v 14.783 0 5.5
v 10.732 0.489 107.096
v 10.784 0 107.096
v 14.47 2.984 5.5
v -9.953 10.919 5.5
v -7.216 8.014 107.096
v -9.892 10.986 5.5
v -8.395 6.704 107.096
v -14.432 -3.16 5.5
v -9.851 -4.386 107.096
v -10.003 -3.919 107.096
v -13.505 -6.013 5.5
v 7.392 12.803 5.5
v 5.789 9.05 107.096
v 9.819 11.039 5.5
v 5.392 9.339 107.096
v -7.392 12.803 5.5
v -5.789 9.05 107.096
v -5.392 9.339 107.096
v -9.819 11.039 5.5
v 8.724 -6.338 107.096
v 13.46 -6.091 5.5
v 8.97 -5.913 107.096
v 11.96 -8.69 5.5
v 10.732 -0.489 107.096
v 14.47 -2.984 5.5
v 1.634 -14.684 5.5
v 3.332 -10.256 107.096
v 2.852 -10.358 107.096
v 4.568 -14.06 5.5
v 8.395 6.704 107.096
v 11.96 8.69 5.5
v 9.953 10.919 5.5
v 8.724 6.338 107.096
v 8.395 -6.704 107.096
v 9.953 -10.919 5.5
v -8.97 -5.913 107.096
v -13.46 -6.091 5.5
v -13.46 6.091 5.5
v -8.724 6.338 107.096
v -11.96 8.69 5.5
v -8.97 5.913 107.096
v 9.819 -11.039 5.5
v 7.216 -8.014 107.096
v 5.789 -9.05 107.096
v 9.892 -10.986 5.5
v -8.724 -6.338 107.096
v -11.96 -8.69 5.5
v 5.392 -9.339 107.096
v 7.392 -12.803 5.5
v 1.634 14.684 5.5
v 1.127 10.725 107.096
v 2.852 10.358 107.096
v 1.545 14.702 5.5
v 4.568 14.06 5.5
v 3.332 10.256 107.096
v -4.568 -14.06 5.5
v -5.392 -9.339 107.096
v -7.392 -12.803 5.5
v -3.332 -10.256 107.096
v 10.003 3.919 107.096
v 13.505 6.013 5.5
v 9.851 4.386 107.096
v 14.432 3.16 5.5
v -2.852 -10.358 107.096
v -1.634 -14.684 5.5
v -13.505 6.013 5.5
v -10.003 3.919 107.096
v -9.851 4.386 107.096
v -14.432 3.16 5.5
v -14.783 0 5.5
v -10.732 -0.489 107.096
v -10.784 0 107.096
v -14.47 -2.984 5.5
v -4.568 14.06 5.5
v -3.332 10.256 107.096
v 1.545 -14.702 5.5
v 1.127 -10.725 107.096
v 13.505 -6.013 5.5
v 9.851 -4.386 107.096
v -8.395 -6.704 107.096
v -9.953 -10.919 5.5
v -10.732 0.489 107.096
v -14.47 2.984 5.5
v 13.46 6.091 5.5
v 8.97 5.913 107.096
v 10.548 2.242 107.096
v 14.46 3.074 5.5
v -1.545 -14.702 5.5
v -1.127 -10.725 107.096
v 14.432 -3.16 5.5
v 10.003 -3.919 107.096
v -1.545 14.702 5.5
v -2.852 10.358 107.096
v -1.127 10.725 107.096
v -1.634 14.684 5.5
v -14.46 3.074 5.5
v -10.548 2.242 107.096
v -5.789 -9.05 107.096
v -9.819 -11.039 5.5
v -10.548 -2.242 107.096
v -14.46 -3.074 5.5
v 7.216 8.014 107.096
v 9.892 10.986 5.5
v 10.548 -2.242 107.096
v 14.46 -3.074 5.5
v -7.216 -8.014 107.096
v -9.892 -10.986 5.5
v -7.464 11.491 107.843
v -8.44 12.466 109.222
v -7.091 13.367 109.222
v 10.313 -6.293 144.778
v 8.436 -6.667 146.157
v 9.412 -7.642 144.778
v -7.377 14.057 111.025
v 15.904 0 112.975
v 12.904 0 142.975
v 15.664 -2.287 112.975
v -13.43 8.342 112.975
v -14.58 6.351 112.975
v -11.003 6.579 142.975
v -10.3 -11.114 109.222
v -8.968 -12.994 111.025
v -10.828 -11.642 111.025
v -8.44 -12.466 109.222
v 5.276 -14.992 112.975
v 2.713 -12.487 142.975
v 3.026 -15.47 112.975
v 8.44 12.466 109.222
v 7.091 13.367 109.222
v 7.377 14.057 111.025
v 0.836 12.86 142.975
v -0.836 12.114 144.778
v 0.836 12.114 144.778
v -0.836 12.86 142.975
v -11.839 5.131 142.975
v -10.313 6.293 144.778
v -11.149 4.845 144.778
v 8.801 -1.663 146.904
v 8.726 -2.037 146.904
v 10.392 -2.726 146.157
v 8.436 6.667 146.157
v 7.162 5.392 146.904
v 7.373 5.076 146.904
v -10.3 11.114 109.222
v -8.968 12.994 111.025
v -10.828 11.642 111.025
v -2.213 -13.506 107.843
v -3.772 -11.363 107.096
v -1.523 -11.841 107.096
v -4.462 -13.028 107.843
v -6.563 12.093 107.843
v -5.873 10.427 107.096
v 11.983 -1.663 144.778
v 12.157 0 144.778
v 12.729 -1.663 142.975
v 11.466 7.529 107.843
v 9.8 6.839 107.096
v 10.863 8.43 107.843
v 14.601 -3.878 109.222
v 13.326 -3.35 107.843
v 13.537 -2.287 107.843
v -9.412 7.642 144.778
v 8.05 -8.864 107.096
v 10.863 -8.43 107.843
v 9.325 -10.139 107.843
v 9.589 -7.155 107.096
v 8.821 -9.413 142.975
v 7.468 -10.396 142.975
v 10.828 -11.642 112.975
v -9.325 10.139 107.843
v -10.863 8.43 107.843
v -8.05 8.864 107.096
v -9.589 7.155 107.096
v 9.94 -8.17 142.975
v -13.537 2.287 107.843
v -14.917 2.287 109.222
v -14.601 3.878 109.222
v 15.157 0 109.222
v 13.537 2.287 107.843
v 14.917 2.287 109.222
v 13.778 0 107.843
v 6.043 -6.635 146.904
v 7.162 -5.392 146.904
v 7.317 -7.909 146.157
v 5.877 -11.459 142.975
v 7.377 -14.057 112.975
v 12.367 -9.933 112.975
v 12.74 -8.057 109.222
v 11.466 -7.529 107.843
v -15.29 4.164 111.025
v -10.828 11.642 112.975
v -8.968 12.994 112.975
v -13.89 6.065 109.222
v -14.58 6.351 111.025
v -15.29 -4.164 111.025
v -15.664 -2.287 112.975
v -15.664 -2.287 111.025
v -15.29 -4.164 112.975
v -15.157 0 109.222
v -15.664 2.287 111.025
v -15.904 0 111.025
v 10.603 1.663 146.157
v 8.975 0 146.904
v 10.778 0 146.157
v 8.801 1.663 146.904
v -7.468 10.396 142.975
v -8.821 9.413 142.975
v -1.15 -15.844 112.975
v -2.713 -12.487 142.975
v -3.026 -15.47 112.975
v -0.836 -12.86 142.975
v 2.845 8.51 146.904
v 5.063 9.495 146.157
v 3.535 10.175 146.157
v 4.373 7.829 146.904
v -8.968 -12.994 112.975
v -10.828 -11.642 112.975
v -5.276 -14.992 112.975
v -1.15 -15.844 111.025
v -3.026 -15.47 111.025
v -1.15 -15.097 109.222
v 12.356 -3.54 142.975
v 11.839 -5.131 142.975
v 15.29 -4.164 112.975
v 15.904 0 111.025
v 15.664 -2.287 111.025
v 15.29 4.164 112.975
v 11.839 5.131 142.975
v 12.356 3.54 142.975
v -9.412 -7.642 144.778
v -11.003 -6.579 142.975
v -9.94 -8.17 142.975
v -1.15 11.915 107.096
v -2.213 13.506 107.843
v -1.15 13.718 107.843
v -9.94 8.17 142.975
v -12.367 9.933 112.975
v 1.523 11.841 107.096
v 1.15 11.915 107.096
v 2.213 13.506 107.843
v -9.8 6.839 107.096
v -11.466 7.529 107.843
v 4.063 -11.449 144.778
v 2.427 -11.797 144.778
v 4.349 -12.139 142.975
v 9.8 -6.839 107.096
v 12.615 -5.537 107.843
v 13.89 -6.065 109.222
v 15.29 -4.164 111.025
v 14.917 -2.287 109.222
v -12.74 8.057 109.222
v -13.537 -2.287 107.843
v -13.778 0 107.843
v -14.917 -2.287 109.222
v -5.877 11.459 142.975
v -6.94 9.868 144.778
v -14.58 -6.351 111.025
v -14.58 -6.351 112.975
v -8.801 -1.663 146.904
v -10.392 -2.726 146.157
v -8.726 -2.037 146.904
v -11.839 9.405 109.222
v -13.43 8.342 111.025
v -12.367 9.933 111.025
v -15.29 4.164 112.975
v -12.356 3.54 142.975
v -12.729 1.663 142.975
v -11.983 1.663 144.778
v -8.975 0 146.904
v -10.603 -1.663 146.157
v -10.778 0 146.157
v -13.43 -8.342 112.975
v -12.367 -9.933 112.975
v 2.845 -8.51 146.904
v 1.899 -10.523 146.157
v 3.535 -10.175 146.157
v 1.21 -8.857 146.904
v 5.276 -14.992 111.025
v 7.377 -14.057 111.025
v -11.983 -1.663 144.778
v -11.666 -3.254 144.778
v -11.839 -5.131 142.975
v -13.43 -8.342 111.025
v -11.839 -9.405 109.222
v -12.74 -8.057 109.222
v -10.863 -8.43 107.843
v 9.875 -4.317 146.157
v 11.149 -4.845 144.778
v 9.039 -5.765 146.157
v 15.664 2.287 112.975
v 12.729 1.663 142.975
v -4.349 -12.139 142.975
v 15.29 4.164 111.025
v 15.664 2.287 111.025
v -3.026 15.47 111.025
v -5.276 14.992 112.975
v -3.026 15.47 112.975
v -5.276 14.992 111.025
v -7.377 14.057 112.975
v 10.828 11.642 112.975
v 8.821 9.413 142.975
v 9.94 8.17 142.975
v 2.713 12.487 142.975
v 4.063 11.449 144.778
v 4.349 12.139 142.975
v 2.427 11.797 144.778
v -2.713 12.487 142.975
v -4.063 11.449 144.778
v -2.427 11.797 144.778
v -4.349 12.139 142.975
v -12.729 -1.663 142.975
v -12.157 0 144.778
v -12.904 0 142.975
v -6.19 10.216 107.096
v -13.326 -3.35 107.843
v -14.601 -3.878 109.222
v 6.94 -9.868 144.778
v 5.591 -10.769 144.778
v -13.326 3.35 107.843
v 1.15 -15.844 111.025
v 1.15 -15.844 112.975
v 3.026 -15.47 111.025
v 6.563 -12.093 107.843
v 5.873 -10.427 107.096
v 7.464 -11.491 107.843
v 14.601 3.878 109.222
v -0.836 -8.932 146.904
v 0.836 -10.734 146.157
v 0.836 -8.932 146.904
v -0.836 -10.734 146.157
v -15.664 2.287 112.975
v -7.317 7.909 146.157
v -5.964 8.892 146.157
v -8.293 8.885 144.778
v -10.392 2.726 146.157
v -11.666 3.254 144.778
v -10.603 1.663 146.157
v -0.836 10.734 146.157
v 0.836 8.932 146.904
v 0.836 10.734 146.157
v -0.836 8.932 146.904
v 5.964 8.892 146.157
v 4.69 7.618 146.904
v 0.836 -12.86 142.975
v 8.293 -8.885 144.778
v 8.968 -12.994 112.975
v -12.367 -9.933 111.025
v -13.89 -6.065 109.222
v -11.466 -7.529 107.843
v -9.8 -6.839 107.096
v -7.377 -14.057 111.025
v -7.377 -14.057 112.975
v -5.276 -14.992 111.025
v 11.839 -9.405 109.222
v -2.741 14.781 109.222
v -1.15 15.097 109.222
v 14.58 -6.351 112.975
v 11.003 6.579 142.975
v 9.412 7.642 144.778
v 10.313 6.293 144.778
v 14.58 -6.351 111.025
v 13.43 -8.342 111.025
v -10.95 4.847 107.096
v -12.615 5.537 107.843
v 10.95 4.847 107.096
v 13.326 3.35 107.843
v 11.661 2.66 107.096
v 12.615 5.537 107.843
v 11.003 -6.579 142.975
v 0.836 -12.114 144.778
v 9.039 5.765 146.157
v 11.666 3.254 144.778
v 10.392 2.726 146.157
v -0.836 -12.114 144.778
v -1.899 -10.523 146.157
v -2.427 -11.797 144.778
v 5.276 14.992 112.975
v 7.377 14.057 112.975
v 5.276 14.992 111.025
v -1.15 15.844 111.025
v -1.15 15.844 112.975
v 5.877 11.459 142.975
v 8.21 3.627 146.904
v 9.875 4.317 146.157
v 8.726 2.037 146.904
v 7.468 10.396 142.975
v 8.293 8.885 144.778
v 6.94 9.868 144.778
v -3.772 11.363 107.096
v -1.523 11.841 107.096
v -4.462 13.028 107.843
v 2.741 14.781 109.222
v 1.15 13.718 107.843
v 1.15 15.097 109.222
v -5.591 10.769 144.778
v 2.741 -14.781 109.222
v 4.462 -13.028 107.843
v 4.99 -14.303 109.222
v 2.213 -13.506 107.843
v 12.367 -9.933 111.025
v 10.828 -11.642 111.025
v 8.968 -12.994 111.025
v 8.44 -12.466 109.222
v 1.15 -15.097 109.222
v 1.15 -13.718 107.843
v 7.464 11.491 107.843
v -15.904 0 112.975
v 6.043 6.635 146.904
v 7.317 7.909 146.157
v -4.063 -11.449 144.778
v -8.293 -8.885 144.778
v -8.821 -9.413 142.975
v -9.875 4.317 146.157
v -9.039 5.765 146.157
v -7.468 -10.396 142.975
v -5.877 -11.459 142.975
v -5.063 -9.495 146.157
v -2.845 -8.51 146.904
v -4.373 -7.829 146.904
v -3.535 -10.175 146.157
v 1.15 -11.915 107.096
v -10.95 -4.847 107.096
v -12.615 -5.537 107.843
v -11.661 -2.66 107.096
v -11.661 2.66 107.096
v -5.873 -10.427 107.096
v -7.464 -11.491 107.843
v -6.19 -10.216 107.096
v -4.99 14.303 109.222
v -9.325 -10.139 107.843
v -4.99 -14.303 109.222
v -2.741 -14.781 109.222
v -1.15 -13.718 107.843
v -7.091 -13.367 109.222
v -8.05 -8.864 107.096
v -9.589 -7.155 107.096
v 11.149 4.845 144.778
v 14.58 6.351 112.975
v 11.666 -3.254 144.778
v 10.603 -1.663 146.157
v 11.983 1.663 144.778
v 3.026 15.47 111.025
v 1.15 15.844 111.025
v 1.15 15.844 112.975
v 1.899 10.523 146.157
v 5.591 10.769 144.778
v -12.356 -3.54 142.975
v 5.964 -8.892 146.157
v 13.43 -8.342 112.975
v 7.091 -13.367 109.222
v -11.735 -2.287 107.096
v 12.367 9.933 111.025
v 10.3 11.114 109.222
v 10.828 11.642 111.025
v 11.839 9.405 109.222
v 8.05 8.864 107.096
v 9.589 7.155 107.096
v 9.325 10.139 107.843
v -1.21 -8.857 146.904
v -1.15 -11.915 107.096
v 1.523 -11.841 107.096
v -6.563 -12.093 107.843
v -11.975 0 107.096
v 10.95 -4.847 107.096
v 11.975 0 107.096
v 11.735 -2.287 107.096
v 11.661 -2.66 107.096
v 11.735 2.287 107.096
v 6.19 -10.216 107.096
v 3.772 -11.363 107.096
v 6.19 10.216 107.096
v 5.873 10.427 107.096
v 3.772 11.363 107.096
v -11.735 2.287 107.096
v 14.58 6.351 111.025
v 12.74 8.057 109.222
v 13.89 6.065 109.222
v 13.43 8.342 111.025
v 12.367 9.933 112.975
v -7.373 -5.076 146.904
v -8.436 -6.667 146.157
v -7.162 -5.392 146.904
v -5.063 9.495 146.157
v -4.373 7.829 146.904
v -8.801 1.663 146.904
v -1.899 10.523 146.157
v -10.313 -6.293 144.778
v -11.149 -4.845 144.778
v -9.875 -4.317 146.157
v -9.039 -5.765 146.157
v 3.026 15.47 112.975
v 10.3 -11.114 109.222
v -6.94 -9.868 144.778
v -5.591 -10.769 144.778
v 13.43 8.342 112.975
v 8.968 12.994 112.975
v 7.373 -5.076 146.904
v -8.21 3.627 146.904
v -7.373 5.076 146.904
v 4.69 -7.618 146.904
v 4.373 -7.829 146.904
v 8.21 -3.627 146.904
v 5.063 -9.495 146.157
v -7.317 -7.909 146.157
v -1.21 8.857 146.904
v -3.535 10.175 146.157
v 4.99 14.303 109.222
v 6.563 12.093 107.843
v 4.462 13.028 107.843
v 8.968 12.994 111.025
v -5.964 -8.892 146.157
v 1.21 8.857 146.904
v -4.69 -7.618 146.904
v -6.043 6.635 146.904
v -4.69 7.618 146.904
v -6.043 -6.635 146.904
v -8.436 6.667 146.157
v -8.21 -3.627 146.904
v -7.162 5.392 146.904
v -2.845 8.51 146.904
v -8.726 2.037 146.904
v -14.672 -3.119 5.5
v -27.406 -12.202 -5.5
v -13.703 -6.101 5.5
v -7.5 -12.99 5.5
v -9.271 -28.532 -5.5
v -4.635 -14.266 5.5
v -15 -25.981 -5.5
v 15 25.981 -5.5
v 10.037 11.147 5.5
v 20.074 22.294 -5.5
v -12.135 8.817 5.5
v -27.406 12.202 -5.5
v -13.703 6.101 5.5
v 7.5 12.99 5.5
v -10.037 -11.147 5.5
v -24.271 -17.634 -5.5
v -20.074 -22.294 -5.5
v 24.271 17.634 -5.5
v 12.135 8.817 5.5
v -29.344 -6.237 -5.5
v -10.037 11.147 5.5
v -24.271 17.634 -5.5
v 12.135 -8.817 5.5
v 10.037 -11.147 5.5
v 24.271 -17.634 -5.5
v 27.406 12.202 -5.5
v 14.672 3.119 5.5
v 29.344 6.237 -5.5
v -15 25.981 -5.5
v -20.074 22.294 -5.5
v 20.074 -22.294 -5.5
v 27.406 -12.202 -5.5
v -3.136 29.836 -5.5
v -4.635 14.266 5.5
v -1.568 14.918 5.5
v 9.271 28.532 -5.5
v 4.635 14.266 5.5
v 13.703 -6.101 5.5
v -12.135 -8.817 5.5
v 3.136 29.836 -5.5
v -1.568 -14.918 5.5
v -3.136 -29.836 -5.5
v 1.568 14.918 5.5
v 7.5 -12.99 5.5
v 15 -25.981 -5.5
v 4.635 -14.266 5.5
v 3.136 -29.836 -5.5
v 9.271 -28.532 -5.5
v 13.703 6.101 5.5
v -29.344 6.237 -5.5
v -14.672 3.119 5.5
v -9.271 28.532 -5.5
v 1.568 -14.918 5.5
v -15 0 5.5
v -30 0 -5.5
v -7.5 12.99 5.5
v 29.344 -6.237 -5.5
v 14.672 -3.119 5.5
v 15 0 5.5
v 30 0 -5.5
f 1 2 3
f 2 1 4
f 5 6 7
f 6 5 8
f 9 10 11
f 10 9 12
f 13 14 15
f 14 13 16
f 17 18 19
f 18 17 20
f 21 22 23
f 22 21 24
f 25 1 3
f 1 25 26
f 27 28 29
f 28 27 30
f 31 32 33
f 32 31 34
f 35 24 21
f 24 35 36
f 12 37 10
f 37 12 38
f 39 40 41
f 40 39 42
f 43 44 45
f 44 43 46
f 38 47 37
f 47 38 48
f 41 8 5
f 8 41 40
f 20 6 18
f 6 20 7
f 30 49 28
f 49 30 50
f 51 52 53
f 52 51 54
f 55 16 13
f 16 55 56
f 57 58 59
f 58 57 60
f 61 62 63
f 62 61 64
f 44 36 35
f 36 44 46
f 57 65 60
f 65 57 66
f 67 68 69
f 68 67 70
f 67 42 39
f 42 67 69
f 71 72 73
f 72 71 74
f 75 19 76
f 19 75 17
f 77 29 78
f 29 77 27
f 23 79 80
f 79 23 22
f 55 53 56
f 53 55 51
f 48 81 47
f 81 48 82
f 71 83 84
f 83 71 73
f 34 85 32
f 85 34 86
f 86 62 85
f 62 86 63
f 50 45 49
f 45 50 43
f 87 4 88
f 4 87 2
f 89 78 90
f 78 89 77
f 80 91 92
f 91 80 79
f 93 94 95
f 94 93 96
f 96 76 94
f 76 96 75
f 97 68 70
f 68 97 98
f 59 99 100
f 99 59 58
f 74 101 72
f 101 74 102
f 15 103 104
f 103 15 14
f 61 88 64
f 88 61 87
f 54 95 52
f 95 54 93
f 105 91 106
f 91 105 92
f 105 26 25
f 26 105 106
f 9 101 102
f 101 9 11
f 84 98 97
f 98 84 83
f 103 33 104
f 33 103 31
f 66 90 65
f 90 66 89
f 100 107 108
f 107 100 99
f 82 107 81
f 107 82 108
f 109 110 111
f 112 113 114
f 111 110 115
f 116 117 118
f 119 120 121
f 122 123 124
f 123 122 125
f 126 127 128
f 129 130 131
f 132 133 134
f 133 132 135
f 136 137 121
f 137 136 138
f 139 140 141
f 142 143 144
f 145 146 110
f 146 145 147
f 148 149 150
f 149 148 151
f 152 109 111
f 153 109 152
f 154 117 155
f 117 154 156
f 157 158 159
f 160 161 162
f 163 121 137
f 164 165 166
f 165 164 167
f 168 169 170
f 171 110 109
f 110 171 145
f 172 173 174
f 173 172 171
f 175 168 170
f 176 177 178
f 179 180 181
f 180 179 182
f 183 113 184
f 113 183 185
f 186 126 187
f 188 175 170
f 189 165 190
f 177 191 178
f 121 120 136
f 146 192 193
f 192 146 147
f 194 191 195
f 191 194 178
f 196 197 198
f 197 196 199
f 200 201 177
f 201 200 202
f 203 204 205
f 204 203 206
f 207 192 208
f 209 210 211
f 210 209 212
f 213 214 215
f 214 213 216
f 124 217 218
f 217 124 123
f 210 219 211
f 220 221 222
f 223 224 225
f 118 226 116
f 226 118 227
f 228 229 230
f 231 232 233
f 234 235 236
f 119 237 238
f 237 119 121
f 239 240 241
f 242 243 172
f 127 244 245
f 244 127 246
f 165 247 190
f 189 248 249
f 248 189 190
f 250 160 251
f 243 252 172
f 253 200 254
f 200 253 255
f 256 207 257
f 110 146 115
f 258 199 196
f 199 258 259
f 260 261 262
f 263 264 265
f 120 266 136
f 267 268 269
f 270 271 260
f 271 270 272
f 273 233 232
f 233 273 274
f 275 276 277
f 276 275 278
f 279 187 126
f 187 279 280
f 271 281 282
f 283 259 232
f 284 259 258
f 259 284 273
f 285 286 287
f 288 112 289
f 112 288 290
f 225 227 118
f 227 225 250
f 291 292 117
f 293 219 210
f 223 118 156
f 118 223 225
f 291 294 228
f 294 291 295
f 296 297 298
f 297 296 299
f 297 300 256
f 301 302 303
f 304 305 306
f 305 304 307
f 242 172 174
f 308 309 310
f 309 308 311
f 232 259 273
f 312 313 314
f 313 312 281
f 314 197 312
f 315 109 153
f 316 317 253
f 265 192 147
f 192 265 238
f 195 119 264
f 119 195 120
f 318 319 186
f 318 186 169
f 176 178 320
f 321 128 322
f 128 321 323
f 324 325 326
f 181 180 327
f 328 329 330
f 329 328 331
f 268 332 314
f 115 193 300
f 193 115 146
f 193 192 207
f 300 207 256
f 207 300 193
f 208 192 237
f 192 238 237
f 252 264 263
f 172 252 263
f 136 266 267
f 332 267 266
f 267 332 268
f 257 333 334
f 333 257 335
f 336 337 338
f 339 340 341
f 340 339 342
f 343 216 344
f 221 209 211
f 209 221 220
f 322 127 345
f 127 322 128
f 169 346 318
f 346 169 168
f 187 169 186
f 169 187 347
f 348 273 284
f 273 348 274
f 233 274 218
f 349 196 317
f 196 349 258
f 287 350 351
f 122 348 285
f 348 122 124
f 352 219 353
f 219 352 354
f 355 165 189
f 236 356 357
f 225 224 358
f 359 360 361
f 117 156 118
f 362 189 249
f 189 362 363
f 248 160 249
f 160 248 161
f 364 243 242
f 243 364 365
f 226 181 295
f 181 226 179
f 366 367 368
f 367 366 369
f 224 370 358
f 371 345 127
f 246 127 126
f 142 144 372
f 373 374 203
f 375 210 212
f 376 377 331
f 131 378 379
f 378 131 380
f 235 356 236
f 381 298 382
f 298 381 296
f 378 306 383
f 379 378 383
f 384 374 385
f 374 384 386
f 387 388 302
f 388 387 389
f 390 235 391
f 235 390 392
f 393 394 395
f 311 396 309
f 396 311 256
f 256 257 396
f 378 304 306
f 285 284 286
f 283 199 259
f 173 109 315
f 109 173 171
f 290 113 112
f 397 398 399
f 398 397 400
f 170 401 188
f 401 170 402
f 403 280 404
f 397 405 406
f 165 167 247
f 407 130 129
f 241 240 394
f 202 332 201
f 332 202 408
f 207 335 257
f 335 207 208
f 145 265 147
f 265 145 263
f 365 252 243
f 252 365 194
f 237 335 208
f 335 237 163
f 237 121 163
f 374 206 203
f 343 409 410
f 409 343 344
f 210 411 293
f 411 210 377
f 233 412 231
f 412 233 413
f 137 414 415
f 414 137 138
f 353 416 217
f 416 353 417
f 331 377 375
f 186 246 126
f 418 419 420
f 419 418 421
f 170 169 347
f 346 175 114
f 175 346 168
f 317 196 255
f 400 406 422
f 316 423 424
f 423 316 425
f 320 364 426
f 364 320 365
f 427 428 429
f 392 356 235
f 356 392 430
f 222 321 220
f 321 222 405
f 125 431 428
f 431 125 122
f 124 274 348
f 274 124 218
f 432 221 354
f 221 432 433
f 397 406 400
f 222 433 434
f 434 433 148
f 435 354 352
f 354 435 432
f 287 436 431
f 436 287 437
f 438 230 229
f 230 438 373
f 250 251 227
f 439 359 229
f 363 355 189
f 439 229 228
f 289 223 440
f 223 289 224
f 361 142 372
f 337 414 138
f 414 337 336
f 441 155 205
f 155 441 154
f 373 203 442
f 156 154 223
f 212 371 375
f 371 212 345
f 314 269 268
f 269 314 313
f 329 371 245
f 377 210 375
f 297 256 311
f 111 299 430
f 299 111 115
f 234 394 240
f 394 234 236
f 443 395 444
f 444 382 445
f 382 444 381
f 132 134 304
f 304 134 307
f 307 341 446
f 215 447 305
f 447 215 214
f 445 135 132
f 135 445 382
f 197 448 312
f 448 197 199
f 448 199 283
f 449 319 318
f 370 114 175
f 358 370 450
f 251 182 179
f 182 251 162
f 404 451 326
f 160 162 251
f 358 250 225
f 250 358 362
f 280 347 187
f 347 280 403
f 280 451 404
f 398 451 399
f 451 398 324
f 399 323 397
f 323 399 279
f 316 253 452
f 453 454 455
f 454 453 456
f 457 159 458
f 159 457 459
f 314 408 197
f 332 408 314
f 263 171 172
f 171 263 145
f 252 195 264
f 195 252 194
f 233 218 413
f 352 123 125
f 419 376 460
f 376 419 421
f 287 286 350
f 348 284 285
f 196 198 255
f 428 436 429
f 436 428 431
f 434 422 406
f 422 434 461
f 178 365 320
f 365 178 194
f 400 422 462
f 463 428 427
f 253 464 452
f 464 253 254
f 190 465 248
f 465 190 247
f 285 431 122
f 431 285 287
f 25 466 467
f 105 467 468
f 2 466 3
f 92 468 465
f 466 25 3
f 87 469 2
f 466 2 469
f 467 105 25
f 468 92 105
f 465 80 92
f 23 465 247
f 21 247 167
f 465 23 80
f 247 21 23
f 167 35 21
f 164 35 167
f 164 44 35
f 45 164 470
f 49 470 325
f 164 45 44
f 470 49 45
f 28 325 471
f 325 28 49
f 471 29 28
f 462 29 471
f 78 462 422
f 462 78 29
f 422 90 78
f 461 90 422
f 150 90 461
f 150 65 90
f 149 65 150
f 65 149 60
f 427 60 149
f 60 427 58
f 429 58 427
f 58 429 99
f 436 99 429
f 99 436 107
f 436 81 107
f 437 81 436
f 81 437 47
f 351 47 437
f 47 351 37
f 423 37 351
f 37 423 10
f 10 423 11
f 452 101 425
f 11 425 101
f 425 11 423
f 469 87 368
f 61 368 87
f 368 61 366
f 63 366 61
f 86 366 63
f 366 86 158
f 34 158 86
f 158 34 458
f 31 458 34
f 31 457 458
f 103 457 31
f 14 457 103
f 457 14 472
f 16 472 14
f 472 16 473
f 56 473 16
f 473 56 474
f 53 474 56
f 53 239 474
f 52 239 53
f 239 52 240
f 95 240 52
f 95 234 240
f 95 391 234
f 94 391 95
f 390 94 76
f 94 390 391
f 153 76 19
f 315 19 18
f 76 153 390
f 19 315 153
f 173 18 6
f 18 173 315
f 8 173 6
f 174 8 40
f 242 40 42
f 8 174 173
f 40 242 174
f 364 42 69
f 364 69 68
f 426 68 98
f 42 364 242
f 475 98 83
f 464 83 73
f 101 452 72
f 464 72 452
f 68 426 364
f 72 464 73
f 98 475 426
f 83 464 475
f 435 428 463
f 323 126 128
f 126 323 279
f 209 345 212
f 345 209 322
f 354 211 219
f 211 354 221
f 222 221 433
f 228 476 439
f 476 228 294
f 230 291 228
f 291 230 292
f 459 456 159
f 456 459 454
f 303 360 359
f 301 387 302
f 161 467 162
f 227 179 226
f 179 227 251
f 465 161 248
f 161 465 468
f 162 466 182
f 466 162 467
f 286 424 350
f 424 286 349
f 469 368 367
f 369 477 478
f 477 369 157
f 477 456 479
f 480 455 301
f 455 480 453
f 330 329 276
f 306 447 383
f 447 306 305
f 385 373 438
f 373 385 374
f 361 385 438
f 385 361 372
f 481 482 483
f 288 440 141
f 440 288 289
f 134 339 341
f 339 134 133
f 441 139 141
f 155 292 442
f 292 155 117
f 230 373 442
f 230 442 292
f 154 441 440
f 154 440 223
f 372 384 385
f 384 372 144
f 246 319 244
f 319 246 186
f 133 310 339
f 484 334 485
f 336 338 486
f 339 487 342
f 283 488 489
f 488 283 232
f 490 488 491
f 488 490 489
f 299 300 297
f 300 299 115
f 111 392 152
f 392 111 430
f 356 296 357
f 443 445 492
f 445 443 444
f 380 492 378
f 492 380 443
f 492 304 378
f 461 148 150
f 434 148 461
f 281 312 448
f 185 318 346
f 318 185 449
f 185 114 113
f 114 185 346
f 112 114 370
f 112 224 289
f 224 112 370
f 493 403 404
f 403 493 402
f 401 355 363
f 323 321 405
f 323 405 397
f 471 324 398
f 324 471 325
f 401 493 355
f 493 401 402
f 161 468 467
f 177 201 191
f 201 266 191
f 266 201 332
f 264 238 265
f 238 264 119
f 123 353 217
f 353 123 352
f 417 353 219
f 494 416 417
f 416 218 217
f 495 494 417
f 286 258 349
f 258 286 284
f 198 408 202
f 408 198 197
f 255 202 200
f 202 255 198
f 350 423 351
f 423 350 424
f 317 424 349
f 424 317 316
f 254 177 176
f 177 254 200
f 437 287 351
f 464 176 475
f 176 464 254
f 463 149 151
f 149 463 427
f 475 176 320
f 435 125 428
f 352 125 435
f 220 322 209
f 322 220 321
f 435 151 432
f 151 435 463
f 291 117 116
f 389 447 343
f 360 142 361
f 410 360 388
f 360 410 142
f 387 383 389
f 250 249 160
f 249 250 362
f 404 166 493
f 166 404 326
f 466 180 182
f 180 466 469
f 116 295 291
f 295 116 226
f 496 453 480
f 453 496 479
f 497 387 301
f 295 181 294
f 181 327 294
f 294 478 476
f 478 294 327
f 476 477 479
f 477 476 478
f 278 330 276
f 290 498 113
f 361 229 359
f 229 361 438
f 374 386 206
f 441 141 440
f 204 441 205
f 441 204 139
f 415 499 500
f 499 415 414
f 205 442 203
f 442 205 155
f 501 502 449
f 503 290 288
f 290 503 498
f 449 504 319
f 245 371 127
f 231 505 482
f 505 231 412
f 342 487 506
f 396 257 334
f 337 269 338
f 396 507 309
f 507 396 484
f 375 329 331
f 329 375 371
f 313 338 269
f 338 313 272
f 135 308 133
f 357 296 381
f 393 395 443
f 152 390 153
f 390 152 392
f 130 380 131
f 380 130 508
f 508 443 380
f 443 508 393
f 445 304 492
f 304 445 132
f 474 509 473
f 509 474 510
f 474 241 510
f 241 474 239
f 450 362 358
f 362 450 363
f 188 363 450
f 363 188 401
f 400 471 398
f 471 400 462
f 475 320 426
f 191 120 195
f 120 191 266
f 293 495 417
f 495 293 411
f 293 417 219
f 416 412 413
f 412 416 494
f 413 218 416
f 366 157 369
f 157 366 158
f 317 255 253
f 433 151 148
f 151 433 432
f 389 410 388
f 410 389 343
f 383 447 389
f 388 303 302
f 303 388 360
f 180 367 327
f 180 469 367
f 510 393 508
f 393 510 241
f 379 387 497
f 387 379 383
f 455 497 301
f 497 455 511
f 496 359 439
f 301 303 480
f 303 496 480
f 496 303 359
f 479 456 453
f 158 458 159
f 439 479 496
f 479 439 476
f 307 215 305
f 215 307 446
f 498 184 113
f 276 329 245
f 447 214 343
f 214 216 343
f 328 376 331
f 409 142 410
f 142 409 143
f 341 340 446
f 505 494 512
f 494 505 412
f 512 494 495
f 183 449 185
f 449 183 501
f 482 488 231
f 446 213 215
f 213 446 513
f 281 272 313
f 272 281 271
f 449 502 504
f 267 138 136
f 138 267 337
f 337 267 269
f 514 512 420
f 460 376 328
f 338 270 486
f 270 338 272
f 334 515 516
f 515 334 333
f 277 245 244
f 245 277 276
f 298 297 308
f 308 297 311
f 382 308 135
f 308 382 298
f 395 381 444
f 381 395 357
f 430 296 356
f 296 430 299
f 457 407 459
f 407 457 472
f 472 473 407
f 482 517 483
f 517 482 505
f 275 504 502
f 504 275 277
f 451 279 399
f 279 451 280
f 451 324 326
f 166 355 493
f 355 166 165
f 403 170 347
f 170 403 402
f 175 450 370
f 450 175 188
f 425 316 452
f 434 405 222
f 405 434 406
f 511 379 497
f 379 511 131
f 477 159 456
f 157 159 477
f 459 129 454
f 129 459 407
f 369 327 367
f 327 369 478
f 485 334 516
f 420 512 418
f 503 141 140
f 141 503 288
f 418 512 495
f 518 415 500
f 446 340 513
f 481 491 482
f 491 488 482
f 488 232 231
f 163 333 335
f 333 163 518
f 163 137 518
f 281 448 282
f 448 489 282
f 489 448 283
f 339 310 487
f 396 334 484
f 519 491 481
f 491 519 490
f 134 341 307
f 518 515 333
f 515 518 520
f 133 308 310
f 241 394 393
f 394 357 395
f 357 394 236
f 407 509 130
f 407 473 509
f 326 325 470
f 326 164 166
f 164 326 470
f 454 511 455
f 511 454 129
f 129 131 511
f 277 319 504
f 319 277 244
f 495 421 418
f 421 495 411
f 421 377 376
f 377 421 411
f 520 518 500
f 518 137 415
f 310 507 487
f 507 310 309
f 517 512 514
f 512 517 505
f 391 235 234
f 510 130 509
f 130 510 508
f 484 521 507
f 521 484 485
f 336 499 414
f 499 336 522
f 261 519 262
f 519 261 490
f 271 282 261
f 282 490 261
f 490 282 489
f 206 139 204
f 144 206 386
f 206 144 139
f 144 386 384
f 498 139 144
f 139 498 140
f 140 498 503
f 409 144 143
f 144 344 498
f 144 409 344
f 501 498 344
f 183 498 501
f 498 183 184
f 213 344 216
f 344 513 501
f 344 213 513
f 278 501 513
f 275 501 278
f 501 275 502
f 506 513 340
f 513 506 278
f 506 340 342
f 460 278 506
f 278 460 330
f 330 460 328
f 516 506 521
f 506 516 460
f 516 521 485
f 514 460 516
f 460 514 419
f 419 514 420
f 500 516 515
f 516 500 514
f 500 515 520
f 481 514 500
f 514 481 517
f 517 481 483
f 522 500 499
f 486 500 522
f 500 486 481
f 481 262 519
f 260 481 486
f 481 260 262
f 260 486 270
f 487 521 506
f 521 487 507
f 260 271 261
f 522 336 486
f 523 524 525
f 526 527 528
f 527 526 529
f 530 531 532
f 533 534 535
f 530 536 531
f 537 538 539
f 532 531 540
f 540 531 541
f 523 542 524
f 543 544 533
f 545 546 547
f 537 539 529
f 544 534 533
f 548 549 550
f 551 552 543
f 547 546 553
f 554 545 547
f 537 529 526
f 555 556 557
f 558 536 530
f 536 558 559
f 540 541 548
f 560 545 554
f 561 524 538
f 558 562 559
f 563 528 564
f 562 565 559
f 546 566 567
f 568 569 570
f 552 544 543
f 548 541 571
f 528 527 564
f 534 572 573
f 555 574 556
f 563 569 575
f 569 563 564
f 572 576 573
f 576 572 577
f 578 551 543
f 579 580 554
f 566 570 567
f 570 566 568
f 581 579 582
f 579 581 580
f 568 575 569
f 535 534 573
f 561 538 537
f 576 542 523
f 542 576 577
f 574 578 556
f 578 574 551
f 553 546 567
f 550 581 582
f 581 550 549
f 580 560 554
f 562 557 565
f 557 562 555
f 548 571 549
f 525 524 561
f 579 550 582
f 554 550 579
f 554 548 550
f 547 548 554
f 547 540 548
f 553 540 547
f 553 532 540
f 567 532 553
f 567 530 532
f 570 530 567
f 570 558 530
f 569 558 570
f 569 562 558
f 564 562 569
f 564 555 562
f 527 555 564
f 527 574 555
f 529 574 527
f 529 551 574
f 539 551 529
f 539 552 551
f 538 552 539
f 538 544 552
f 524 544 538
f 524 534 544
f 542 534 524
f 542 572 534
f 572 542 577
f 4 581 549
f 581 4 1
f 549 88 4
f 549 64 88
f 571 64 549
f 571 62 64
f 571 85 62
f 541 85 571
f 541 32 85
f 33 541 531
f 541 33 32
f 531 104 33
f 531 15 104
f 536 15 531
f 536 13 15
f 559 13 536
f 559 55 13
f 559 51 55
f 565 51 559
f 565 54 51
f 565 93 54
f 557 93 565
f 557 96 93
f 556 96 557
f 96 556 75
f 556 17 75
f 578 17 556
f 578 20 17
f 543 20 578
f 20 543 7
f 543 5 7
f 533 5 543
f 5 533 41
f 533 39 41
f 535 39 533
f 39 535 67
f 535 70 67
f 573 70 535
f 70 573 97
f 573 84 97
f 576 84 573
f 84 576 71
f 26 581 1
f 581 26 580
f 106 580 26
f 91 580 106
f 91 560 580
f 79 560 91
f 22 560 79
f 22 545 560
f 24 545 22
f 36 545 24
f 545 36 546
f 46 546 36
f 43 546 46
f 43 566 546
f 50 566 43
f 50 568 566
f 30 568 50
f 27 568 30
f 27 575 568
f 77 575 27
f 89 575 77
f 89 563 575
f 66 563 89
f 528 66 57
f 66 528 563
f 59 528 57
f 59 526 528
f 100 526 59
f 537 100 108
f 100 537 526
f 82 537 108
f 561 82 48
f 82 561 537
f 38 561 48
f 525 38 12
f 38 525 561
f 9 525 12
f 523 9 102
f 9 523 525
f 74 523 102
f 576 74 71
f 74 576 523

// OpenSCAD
// parameters
l = 127; // length of the shaft
sr1 = 15; // shaft radius 1
sr2 = 10; // shaft radius 2
kr1 = sr2 *1.1;
kr2 = sr2 *0.8;

br1 = 30; // base radius 1
br2 = sr1; // base radius 2
bh = 11; // base height
module schaft() {
    // body...
    cylinder(h=l, r1=sr1, r2=sr2, center=true);
    minkowski() {
        translate([0,0,l/2])
        cylinder(h=30, r1=kr1, r2=kr2, center=true);
        sphere(r=5);
    }
}

module basis() {
    // body...
    cylinder(h=bh, r1=br1, r2=br2, center=true);
    
}

module massageStab() {
    union() {
        translate([0,0,l/2])
            schaft();
        basis();
    }
}

massageStab();
